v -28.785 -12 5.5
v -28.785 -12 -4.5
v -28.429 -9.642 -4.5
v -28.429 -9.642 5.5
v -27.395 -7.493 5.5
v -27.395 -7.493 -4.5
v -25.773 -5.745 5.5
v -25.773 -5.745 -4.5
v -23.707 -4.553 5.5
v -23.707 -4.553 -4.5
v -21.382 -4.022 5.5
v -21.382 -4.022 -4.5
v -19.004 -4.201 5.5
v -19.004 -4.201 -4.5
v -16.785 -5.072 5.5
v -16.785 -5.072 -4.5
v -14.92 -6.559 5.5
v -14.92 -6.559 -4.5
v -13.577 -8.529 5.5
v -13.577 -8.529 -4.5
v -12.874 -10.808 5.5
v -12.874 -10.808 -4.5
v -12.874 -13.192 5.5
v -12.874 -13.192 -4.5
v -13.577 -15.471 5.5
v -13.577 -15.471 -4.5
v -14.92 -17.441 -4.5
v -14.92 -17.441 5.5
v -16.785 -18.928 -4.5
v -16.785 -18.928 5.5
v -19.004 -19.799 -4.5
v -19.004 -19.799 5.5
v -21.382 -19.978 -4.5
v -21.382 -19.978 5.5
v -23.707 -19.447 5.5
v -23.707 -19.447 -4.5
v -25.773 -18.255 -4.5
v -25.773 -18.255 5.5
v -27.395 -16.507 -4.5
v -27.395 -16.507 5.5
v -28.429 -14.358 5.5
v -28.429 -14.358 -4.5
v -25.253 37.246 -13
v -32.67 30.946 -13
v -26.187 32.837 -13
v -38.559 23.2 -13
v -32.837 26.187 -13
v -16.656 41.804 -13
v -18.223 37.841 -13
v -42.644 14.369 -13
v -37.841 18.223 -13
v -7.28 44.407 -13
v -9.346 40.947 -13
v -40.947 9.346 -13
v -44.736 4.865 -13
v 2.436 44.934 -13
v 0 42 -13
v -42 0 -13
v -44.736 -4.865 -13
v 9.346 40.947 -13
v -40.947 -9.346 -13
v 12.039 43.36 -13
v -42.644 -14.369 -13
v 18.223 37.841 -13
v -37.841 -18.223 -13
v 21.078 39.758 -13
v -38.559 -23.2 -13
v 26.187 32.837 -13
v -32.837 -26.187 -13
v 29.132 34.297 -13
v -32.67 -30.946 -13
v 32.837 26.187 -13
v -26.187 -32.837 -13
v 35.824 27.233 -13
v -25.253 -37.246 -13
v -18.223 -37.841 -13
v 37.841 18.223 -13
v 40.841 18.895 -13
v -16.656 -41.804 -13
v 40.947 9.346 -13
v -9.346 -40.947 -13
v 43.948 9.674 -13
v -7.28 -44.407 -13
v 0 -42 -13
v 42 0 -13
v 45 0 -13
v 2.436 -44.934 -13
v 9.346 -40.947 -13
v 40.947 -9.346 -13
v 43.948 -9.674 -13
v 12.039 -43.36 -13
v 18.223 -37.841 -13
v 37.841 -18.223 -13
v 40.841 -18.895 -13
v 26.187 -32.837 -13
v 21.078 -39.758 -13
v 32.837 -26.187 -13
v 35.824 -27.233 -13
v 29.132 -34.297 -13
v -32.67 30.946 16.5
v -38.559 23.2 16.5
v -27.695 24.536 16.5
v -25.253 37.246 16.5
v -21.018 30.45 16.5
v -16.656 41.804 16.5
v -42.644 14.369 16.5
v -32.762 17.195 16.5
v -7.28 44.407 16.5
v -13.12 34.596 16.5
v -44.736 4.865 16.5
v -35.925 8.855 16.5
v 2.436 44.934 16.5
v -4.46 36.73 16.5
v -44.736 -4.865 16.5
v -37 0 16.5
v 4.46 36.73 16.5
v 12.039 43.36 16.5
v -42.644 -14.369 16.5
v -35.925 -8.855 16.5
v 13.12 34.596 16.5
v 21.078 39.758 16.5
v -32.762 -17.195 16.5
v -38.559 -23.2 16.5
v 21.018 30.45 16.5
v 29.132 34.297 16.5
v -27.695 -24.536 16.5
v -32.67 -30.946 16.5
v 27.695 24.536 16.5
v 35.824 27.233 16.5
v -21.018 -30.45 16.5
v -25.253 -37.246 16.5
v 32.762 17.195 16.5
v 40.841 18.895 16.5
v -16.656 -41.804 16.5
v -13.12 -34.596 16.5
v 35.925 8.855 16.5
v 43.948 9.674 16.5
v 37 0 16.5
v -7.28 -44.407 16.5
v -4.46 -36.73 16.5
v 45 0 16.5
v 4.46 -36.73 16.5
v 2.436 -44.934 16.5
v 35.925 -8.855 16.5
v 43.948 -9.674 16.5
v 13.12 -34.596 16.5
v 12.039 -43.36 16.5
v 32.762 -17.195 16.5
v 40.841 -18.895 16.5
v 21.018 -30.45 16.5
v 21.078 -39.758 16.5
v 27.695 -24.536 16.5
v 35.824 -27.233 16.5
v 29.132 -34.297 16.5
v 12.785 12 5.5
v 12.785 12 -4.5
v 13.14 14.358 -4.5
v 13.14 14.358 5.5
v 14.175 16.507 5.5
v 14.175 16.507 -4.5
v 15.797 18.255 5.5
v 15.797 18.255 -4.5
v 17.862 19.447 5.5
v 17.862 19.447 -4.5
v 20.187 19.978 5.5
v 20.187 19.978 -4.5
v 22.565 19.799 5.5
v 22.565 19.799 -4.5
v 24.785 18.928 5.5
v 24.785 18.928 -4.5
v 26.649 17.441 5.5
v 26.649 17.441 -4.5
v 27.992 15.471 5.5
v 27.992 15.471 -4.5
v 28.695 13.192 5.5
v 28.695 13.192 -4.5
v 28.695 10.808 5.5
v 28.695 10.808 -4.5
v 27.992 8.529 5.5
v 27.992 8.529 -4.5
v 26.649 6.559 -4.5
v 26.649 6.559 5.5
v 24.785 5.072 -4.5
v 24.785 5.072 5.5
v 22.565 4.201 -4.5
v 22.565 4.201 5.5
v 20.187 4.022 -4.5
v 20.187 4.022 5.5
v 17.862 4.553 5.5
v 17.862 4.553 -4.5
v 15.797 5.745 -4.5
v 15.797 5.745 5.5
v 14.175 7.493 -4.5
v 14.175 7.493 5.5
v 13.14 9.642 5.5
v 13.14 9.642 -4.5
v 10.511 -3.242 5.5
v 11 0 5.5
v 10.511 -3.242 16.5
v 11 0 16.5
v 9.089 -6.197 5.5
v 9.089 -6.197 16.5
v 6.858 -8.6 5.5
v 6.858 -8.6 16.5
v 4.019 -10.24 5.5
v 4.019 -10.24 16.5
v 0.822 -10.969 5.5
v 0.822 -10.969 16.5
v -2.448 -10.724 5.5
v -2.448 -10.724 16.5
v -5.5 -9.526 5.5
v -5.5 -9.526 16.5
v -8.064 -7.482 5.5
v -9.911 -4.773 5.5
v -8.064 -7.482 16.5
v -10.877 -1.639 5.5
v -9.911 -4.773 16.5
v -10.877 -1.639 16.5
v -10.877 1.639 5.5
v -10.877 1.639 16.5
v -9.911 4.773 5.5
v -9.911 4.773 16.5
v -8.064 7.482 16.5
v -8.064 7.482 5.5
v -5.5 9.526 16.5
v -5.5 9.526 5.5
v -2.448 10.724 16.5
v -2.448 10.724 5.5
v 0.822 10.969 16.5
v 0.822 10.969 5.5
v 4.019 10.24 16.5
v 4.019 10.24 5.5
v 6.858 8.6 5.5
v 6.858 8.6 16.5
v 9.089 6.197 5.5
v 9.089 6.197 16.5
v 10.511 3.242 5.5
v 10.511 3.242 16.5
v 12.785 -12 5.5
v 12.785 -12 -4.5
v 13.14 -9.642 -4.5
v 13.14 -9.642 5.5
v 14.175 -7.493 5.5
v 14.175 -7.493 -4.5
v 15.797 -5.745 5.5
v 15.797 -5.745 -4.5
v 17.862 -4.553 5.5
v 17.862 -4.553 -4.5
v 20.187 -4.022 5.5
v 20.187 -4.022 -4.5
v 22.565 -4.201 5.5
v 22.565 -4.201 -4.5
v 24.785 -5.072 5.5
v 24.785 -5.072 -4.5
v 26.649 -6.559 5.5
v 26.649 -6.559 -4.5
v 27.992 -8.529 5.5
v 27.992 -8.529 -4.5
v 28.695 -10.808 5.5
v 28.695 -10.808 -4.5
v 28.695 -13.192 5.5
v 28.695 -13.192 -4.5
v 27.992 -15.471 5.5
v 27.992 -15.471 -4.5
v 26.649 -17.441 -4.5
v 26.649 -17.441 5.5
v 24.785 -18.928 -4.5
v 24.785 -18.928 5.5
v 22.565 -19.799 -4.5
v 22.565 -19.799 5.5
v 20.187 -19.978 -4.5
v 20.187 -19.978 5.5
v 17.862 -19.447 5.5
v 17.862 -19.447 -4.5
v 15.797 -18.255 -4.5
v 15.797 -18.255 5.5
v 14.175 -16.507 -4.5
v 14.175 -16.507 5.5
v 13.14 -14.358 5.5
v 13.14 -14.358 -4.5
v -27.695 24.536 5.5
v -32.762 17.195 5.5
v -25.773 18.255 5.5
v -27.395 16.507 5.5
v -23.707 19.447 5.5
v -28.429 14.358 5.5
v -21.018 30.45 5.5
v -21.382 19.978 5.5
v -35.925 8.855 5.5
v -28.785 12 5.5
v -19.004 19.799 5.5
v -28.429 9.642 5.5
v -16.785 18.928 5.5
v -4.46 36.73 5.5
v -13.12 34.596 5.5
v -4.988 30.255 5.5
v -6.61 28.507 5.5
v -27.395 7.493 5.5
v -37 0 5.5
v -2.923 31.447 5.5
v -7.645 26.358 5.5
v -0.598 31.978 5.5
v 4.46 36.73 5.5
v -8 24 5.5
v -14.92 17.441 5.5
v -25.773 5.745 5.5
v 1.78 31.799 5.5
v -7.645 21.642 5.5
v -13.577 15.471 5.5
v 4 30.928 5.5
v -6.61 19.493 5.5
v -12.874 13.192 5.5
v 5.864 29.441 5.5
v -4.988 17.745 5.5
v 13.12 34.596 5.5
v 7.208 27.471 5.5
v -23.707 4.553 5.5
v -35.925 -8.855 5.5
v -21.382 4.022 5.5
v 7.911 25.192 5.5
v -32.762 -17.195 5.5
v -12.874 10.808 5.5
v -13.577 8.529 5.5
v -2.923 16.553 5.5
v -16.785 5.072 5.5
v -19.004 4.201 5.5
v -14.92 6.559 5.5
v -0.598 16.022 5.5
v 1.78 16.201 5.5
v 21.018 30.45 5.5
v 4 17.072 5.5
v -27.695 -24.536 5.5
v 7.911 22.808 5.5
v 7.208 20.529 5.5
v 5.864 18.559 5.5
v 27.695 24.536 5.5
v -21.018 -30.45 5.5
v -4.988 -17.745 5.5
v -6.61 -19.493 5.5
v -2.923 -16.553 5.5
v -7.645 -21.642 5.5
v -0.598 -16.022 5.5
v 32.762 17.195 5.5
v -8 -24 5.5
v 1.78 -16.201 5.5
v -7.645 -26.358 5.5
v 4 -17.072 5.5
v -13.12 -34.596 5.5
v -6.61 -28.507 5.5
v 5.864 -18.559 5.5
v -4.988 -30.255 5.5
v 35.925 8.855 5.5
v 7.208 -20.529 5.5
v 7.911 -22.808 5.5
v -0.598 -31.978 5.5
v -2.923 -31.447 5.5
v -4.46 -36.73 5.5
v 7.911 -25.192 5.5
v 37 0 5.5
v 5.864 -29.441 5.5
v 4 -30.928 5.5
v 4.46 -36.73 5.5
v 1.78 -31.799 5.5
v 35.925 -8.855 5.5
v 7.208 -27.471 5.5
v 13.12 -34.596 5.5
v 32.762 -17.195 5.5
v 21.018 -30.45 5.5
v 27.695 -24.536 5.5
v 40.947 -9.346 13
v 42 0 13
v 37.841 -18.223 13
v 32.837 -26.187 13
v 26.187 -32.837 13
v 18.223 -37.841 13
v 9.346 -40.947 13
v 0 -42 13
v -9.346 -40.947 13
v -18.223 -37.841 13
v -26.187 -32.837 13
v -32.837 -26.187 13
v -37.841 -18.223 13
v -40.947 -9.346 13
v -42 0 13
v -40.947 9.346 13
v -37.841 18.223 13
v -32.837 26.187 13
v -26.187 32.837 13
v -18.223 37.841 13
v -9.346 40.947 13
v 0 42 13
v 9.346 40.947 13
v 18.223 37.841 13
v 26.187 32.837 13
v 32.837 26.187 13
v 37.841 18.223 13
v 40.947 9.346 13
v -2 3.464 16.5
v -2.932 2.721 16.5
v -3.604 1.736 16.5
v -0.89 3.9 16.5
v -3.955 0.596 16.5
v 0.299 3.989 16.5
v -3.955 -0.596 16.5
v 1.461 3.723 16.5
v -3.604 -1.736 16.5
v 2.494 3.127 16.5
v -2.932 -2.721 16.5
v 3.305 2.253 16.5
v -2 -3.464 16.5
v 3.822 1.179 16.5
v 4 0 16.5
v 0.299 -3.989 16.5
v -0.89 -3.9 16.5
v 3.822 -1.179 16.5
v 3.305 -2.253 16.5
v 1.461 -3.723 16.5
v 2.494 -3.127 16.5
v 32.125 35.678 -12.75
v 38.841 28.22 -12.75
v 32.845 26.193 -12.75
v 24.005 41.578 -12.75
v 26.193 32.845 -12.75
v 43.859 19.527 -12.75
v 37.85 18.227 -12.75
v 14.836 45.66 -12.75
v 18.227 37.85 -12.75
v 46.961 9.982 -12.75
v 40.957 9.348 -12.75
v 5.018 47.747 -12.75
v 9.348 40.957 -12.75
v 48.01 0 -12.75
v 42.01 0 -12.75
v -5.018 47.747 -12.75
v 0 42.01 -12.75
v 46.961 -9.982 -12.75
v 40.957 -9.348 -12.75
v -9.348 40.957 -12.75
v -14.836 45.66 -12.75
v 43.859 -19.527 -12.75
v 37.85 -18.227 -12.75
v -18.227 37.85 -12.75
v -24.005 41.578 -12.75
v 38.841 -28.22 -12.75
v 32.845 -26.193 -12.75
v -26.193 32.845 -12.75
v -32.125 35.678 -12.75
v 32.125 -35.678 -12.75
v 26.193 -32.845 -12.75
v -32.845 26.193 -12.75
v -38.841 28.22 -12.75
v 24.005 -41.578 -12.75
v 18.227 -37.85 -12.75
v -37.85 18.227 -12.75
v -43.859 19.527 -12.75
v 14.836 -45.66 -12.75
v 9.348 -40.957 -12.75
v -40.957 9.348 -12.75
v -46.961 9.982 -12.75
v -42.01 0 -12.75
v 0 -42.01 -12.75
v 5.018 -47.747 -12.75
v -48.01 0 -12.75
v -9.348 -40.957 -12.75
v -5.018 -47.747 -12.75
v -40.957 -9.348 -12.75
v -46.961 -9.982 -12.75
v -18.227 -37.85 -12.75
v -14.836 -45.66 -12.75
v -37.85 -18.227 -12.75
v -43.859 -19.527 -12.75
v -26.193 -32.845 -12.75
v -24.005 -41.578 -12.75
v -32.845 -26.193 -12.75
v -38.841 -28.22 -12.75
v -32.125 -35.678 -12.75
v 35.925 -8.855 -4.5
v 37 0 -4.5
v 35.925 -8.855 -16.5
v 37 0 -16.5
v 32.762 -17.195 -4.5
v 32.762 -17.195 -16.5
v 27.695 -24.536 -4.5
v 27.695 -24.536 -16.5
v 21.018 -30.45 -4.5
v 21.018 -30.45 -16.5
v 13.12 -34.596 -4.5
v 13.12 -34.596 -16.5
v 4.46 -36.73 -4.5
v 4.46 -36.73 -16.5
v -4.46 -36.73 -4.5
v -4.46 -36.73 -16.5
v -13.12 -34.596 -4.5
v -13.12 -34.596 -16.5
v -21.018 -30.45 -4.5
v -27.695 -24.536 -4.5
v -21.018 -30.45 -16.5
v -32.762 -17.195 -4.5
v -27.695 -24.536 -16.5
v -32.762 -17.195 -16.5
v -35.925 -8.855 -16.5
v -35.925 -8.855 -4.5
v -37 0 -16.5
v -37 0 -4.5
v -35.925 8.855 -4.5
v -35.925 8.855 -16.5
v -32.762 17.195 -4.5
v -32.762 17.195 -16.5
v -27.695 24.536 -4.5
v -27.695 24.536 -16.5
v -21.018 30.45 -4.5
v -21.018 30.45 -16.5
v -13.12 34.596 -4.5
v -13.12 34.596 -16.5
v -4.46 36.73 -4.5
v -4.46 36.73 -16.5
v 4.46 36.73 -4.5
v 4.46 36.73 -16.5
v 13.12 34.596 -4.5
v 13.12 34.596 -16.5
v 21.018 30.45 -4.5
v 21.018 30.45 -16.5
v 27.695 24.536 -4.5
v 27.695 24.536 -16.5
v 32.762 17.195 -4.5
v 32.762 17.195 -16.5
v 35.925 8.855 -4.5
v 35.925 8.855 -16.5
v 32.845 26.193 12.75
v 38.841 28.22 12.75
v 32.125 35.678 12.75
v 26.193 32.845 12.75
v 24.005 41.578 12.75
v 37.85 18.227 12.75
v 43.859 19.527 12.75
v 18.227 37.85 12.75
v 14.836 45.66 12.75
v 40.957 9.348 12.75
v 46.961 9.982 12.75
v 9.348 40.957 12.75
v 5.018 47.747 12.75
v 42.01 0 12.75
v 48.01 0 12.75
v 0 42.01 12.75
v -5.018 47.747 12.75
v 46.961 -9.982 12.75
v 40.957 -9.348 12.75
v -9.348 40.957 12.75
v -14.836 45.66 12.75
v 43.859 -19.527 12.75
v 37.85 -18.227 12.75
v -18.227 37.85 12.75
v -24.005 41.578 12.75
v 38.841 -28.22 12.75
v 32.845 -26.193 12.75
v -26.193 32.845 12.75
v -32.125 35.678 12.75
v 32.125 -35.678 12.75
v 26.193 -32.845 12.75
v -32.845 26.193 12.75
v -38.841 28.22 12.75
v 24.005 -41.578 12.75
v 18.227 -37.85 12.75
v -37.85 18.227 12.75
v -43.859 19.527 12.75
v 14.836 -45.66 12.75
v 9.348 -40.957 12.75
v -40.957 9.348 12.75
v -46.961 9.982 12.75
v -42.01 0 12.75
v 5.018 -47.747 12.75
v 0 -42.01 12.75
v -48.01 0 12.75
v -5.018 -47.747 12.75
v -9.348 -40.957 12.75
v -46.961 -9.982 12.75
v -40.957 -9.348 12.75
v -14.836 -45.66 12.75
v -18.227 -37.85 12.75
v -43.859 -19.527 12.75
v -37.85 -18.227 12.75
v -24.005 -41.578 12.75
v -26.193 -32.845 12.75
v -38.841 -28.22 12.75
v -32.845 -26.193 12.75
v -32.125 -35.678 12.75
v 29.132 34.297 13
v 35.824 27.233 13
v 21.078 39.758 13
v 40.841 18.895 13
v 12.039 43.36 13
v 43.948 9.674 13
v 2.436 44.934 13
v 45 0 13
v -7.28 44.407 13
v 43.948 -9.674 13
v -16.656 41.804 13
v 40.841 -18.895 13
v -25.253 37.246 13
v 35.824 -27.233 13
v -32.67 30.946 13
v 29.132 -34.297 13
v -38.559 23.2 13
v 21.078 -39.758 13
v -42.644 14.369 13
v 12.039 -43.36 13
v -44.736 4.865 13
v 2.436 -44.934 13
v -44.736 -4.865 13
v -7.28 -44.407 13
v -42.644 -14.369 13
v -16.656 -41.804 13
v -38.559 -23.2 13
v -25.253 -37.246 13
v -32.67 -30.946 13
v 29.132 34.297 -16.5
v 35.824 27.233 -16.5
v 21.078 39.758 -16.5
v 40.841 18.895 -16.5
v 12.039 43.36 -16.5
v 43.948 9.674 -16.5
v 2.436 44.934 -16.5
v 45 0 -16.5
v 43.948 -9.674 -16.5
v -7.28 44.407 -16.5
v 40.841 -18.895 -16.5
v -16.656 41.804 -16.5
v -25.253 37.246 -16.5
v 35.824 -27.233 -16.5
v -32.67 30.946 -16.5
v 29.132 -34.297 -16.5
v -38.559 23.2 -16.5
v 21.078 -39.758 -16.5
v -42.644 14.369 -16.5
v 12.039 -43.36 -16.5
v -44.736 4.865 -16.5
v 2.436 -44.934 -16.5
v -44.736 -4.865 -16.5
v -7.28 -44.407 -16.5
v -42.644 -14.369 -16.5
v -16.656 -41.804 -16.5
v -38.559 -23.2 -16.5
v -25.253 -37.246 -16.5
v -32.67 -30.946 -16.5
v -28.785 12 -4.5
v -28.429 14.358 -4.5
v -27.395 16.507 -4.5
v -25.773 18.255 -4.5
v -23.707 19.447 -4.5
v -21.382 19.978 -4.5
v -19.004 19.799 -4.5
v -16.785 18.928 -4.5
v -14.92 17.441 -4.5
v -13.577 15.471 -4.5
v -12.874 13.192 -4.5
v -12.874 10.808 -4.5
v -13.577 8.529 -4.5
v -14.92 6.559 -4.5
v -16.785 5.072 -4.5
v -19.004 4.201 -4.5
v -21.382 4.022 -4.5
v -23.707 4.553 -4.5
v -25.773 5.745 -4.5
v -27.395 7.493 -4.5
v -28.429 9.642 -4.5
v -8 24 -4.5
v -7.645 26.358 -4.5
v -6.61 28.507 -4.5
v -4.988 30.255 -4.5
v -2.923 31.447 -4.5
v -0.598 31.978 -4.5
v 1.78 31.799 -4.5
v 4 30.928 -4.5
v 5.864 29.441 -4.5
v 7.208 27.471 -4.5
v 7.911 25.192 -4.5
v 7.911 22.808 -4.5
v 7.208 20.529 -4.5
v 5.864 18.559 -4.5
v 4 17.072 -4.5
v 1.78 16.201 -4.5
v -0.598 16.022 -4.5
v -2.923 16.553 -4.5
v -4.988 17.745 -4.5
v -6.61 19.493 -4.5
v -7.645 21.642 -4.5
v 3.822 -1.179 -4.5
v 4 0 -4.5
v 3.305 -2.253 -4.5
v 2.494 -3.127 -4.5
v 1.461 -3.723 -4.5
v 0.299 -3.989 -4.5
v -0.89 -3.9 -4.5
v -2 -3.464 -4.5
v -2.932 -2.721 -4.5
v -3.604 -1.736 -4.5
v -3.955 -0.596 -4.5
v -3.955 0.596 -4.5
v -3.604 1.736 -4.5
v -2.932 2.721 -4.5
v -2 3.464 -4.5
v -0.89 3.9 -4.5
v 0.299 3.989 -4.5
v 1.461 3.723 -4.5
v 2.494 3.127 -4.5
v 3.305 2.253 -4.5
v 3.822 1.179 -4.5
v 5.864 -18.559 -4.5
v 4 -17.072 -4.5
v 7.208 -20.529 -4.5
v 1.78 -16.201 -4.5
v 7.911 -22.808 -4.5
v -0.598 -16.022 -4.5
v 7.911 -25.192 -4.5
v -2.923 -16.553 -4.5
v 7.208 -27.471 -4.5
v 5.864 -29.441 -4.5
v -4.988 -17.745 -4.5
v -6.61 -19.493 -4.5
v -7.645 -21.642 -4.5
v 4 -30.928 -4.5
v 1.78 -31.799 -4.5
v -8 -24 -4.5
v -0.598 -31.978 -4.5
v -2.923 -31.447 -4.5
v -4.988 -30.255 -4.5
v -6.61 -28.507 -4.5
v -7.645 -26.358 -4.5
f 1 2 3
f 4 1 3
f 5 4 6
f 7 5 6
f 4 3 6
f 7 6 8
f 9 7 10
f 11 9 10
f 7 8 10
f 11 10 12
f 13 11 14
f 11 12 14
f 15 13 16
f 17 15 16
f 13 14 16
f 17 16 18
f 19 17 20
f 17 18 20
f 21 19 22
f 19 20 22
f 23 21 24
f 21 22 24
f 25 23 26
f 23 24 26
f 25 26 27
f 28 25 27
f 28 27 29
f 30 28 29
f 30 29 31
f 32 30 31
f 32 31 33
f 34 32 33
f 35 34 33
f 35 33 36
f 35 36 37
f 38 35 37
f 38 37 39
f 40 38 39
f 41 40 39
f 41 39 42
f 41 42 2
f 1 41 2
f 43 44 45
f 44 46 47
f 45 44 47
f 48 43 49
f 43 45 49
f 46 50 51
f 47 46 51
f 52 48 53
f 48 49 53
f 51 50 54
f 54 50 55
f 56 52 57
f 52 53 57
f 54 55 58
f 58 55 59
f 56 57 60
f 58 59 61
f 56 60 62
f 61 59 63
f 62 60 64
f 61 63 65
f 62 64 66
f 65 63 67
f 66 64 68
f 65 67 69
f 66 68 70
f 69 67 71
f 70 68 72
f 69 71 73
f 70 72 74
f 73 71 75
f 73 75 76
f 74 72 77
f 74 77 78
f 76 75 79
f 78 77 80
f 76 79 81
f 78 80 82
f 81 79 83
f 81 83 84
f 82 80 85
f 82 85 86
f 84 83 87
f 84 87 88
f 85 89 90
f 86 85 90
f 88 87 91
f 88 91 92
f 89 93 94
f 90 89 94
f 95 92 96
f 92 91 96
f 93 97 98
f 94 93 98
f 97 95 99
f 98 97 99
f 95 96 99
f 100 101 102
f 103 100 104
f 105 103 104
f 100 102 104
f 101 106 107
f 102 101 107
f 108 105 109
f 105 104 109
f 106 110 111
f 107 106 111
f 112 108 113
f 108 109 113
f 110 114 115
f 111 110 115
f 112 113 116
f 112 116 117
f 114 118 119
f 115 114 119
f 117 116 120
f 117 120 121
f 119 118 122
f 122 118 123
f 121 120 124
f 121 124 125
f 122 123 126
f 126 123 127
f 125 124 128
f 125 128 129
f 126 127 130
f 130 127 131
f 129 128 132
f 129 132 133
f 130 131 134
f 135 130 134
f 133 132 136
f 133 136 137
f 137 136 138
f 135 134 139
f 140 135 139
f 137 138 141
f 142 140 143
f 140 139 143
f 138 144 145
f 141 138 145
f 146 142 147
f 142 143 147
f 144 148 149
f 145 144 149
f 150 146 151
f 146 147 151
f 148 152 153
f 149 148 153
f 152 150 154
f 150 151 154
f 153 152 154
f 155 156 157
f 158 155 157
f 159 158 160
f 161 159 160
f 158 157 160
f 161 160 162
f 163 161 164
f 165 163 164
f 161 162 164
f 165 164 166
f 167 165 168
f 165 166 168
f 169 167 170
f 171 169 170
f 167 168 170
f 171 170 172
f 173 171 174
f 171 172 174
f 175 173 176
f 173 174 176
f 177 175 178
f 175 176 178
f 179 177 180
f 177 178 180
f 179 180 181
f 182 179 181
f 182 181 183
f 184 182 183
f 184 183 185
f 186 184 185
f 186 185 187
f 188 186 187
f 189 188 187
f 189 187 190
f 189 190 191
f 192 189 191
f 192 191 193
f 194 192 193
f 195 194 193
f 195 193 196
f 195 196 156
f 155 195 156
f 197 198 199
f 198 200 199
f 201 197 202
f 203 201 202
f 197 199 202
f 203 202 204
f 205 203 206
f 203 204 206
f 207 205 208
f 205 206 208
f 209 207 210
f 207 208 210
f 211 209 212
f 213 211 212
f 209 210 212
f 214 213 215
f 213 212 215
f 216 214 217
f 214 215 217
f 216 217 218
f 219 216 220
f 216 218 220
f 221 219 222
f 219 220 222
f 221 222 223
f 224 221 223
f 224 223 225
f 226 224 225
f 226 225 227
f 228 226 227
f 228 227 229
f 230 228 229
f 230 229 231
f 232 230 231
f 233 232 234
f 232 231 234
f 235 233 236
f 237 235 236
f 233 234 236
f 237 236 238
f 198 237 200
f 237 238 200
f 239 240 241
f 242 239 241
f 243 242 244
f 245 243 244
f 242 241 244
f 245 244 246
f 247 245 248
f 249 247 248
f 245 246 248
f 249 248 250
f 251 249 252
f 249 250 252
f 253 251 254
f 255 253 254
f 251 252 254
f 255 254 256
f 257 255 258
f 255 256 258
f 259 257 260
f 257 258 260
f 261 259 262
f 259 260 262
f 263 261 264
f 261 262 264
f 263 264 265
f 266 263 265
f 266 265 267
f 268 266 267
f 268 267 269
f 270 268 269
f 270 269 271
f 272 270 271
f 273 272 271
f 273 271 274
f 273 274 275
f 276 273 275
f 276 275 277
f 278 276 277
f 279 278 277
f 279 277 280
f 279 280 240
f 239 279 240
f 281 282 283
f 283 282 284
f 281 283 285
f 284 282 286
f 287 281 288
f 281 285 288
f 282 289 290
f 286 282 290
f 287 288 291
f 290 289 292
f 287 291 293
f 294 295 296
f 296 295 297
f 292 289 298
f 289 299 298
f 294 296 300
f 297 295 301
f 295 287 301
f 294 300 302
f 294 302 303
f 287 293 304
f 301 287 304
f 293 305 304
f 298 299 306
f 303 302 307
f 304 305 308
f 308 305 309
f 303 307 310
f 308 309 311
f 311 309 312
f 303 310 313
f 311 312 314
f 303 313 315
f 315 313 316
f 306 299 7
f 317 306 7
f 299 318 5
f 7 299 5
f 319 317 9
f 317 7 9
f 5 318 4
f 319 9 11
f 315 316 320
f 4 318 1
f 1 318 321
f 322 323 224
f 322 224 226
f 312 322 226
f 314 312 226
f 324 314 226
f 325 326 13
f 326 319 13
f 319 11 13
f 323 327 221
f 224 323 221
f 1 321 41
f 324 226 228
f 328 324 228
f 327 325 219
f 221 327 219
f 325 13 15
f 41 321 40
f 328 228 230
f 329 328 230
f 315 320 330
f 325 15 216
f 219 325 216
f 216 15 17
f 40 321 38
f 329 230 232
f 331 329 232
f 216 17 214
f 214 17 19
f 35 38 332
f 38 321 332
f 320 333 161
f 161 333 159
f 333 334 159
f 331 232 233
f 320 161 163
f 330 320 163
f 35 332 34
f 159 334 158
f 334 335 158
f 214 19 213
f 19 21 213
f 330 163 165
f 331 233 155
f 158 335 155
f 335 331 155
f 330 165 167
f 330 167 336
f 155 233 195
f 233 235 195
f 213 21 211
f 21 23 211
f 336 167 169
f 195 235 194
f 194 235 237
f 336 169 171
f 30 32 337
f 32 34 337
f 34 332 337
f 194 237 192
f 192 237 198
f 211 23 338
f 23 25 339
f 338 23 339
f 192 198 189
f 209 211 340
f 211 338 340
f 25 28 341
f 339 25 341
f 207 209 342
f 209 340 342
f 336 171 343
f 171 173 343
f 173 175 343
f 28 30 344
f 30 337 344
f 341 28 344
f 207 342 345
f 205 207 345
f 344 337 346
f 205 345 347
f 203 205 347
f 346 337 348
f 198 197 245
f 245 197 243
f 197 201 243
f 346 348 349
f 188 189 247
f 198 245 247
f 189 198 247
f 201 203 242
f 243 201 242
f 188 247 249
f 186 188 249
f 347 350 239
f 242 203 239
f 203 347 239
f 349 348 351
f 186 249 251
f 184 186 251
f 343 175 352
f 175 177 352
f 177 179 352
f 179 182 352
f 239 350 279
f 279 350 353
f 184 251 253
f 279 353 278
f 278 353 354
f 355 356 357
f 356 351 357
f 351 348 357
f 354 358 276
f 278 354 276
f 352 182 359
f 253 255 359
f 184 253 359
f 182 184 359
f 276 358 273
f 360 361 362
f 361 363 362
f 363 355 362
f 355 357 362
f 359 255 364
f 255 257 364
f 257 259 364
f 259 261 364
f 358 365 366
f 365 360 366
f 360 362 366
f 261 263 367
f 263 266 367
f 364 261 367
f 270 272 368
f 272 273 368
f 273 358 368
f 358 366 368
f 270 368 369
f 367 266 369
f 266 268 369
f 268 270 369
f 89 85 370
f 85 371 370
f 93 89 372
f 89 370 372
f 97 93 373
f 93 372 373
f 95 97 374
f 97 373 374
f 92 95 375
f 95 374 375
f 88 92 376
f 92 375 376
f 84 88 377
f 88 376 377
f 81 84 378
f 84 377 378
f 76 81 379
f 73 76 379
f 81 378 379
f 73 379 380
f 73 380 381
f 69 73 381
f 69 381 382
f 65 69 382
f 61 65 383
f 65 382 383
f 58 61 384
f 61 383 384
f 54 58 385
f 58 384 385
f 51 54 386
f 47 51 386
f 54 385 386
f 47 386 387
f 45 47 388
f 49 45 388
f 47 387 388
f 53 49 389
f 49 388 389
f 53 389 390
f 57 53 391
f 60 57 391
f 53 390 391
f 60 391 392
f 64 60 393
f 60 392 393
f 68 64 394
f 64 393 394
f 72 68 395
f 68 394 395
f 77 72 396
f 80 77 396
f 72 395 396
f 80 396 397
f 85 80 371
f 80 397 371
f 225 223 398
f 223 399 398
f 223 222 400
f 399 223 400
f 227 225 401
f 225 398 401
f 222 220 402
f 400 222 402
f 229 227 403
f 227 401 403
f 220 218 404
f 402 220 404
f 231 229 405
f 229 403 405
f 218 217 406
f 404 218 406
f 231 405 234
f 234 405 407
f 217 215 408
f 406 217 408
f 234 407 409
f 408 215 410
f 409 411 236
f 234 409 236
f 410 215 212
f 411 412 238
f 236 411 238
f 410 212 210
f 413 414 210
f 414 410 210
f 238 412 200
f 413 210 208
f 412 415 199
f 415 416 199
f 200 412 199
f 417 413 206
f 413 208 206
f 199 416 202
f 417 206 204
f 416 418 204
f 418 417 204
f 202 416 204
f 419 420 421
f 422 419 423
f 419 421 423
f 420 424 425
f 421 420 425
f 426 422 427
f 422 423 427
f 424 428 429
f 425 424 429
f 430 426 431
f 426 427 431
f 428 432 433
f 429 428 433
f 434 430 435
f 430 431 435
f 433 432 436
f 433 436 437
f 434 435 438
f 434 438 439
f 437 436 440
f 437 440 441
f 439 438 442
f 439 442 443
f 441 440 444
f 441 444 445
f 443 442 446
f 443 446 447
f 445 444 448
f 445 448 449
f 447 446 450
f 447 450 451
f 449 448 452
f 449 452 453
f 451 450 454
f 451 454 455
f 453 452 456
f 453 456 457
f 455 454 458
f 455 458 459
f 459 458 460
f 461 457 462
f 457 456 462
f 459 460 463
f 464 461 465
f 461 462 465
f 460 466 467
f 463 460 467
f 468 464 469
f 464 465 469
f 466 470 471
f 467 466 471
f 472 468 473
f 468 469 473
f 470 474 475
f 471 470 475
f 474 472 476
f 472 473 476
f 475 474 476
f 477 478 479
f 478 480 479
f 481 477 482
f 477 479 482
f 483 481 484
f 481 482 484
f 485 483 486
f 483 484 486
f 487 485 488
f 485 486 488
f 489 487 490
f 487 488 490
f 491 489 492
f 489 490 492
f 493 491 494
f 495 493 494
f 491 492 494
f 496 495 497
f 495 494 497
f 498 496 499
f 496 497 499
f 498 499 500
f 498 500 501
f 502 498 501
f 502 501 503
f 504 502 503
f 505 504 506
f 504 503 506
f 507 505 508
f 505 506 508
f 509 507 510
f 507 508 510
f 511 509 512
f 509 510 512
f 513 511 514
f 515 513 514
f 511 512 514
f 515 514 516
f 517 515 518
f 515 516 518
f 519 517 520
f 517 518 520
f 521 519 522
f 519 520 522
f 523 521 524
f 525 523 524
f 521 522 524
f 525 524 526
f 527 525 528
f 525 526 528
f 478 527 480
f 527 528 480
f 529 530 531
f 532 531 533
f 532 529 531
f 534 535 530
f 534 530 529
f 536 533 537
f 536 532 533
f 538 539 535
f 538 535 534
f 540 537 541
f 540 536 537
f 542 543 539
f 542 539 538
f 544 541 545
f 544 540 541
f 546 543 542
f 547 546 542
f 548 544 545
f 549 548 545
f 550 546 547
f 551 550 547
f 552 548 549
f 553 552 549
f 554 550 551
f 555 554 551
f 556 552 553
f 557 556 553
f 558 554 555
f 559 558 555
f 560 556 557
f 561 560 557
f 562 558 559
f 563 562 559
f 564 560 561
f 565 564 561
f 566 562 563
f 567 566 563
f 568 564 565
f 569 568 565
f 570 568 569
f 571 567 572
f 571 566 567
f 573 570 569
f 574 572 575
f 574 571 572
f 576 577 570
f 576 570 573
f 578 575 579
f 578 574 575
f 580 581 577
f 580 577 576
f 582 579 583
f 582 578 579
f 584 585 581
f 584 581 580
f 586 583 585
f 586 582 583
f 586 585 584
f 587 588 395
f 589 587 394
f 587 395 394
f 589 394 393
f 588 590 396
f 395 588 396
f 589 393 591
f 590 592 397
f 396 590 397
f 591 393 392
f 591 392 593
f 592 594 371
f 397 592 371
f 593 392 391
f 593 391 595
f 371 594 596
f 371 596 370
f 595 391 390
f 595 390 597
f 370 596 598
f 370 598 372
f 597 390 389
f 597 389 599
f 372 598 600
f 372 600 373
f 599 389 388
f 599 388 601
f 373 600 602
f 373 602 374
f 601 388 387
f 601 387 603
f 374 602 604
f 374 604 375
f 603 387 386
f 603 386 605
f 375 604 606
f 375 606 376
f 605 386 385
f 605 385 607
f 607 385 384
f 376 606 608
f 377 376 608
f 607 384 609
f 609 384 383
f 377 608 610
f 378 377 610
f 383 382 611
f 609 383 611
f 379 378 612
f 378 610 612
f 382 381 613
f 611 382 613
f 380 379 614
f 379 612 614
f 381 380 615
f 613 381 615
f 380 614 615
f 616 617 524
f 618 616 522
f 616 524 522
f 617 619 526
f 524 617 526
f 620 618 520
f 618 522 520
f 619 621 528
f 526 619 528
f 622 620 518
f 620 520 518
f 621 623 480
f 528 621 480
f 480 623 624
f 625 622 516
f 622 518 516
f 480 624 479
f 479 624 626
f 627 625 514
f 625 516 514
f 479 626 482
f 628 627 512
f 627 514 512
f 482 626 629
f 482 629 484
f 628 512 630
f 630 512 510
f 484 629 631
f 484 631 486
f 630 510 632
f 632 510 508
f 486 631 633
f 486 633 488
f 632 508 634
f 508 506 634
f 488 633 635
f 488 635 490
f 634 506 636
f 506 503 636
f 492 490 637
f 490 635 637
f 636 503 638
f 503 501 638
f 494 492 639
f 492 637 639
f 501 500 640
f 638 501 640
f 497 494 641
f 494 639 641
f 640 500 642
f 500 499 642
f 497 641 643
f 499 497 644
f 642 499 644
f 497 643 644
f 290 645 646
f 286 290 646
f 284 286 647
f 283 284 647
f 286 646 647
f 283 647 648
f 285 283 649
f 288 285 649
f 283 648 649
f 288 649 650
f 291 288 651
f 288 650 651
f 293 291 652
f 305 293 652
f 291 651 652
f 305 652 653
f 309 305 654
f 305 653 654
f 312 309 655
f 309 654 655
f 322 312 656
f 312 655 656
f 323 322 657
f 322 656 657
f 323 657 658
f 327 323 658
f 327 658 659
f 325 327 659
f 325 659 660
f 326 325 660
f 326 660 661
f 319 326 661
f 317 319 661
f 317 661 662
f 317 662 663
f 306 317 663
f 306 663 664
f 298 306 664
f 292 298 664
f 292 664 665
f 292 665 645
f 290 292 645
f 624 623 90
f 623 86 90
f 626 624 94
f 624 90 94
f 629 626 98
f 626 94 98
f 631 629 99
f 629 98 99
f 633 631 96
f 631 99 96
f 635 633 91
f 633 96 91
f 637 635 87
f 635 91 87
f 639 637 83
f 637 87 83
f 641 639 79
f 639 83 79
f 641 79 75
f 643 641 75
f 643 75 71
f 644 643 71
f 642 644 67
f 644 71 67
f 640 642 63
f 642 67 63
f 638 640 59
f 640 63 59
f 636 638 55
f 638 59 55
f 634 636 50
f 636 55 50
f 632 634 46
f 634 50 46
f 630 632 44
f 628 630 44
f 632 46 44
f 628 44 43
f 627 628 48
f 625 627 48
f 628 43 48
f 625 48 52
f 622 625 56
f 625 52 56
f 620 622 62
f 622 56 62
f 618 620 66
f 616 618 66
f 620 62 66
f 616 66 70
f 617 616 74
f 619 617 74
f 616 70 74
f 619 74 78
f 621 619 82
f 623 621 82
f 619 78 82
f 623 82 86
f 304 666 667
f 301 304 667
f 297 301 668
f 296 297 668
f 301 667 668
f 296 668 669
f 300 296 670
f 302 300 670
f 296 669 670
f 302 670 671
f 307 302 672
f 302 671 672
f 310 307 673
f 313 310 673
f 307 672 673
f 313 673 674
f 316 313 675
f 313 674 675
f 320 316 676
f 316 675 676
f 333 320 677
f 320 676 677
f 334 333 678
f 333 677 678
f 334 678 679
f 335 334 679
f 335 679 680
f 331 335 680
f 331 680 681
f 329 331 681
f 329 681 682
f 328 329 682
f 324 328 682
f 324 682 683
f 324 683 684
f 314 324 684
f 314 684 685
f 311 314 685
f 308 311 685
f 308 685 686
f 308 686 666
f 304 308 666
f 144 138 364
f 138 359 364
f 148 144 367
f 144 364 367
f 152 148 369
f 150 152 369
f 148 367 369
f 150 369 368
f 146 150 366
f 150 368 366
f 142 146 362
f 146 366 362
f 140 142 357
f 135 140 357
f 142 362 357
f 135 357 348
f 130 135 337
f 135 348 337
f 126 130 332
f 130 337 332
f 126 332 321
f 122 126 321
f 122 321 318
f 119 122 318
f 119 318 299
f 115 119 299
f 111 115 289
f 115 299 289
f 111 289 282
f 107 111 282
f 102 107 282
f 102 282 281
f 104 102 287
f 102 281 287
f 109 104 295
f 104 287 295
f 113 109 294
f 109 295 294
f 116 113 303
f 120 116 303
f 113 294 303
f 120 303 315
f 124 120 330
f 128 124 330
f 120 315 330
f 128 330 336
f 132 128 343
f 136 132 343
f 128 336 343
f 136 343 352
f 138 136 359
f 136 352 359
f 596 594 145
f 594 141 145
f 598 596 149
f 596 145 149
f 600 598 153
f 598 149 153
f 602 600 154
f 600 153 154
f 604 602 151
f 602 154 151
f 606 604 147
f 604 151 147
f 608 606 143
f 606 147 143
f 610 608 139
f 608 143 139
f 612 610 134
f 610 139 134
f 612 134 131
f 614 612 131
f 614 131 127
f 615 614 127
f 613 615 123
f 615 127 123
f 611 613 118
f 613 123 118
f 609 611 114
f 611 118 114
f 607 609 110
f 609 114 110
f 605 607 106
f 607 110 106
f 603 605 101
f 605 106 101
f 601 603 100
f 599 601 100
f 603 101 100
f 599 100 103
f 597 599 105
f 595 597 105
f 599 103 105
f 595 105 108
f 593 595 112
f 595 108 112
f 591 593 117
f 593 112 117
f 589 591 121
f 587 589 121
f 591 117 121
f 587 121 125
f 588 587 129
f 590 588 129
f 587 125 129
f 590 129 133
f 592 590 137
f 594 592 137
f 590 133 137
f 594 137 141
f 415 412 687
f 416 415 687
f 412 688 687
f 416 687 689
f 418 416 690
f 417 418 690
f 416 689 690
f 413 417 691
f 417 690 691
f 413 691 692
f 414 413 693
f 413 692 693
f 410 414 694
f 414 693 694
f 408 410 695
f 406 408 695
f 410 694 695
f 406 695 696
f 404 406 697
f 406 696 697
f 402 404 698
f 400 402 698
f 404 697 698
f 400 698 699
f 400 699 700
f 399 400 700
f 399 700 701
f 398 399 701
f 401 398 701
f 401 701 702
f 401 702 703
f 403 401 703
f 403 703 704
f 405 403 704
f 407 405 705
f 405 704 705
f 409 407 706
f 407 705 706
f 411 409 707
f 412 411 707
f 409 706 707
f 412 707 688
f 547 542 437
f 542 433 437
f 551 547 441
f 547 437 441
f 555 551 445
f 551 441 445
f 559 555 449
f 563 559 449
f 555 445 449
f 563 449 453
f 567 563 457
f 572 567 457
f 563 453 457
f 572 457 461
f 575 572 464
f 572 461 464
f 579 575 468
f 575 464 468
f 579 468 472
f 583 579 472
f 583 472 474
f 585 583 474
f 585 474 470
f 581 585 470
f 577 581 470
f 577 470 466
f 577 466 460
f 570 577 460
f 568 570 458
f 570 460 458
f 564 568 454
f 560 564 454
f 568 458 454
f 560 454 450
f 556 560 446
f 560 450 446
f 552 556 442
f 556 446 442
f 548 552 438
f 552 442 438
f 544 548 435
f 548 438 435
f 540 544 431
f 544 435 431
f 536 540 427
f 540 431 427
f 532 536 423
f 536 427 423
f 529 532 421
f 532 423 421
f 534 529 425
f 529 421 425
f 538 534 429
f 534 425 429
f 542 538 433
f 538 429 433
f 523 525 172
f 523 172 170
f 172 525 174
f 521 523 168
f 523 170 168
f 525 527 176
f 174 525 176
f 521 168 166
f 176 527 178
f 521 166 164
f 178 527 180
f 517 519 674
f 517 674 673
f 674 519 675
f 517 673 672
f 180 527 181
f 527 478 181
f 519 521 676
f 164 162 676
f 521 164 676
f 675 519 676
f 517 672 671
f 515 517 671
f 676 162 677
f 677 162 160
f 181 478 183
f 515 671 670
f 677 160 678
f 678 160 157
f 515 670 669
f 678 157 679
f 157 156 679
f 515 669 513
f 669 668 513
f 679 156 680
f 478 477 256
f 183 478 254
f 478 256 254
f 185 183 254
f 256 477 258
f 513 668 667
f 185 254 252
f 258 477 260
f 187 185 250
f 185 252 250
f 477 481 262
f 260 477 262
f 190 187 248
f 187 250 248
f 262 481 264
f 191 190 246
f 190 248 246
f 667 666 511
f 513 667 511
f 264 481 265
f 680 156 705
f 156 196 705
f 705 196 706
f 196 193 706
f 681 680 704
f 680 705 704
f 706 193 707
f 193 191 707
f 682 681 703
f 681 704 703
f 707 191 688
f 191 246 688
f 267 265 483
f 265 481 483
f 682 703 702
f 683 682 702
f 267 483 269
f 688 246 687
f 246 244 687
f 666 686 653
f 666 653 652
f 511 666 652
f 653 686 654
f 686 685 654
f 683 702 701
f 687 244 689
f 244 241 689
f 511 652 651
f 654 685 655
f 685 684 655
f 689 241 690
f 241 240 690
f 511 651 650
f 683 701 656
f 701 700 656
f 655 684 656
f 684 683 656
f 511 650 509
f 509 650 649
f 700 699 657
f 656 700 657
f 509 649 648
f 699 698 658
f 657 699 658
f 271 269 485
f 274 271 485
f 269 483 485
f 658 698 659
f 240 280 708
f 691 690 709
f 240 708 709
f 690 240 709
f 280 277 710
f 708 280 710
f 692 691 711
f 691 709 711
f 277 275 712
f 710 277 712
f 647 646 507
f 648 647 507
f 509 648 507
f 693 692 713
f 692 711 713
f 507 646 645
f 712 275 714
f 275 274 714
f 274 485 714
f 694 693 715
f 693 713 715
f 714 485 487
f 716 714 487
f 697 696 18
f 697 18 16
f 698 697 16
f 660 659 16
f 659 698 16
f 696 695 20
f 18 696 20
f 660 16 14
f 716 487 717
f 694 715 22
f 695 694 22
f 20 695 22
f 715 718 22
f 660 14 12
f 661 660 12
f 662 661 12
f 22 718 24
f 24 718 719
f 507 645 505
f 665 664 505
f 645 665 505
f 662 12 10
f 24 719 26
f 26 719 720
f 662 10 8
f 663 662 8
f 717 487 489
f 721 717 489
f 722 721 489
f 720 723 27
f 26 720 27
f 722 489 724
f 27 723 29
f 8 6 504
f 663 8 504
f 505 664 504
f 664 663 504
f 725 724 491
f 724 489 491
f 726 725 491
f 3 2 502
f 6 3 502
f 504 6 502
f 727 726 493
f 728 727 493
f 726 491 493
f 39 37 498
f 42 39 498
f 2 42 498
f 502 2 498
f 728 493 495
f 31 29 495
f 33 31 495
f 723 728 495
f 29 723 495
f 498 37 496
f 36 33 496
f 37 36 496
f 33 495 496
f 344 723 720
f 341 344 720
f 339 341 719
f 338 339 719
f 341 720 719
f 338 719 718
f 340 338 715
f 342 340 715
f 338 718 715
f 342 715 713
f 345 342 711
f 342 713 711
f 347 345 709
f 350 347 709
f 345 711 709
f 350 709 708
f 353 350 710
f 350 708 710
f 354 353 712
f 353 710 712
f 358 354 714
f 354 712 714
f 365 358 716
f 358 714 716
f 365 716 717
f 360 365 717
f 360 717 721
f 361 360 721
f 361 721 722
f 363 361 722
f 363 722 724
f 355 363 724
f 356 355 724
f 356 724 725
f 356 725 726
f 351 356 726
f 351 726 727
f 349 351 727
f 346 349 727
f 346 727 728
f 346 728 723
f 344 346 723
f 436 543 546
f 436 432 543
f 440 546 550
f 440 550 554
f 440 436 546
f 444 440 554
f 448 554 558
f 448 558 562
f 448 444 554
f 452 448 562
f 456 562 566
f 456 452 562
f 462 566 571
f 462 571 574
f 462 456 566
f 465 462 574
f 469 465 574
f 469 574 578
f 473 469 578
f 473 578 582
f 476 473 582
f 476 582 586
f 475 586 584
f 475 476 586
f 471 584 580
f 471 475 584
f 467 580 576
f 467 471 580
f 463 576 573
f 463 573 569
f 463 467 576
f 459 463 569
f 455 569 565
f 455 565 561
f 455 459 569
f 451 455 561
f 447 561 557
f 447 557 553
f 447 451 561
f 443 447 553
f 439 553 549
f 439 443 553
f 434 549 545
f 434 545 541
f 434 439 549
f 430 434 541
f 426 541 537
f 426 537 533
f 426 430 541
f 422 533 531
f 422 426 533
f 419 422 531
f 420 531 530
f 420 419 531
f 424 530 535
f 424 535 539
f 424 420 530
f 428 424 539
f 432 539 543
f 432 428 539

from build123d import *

# Parameters (mm, degrees)
SKETCH1_W          = 25.5
SKETCH1_H          = 6
SKETCH2_R          = 8
CUT_EXTRUDE1_DEPTH = 72.069826227


with BuildPart() as part:
    # Sketch1 → Revolve1 (revolve)
    with BuildSketch(Plane(origin=(0, 0, 0), x_dir=(0, 0, -1), z_dir=(1, 0, 0)), mode=Mode.PRIVATE) as revolve1_sk:
        Polygon((13, 42), (-13, 42), (-13, 45), (-16.5, 45), (-16.5, 37), (-5.5, 37), (-5.5, 11), (-16.5, 11), (-16.5, 4), (4.5, 4), (4.5, 37), (16.5, 37), (16.5, 45), (13, 45), align=None)
        with Locations((0, 45.01)):
            Rectangle(SKETCH1_W, SKETCH1_H)
    revolve(revolve1_sk.sketch.rotate(Axis((0, 0, 177.272954683), (0, 0, -1)), 90), axis=Axis((0, 0, 177.272954683), (0, 0, -1)))

    # Sketch2 → Cut-Extrude1 (cut, through all)
    with BuildSketch(Plane(origin=(0, 0, -4.5), x_dir=(-1, 0, 0), z_dir=(0, 0, -1))):
        with Locations((0, 24)):
            Circle(SKETCH2_R)
        with Locations((20.784609691, 12)):
            Circle(SKETCH2_R)
        with Locations((20.784609691, -12)):
            Circle(SKETCH2_R)
        with Locations((0, -24)):
            Circle(SKETCH2_R)
        with Locations((-20.784609691, -12)):
            Circle(SKETCH2_R)
        with Locations((-20.784609691, 12)):
            Circle(SKETCH2_R)
    extrude(amount=-CUT_EXTRUDE1_DEPTH, mode=Mode.SUBTRACT)


solid = part.part
